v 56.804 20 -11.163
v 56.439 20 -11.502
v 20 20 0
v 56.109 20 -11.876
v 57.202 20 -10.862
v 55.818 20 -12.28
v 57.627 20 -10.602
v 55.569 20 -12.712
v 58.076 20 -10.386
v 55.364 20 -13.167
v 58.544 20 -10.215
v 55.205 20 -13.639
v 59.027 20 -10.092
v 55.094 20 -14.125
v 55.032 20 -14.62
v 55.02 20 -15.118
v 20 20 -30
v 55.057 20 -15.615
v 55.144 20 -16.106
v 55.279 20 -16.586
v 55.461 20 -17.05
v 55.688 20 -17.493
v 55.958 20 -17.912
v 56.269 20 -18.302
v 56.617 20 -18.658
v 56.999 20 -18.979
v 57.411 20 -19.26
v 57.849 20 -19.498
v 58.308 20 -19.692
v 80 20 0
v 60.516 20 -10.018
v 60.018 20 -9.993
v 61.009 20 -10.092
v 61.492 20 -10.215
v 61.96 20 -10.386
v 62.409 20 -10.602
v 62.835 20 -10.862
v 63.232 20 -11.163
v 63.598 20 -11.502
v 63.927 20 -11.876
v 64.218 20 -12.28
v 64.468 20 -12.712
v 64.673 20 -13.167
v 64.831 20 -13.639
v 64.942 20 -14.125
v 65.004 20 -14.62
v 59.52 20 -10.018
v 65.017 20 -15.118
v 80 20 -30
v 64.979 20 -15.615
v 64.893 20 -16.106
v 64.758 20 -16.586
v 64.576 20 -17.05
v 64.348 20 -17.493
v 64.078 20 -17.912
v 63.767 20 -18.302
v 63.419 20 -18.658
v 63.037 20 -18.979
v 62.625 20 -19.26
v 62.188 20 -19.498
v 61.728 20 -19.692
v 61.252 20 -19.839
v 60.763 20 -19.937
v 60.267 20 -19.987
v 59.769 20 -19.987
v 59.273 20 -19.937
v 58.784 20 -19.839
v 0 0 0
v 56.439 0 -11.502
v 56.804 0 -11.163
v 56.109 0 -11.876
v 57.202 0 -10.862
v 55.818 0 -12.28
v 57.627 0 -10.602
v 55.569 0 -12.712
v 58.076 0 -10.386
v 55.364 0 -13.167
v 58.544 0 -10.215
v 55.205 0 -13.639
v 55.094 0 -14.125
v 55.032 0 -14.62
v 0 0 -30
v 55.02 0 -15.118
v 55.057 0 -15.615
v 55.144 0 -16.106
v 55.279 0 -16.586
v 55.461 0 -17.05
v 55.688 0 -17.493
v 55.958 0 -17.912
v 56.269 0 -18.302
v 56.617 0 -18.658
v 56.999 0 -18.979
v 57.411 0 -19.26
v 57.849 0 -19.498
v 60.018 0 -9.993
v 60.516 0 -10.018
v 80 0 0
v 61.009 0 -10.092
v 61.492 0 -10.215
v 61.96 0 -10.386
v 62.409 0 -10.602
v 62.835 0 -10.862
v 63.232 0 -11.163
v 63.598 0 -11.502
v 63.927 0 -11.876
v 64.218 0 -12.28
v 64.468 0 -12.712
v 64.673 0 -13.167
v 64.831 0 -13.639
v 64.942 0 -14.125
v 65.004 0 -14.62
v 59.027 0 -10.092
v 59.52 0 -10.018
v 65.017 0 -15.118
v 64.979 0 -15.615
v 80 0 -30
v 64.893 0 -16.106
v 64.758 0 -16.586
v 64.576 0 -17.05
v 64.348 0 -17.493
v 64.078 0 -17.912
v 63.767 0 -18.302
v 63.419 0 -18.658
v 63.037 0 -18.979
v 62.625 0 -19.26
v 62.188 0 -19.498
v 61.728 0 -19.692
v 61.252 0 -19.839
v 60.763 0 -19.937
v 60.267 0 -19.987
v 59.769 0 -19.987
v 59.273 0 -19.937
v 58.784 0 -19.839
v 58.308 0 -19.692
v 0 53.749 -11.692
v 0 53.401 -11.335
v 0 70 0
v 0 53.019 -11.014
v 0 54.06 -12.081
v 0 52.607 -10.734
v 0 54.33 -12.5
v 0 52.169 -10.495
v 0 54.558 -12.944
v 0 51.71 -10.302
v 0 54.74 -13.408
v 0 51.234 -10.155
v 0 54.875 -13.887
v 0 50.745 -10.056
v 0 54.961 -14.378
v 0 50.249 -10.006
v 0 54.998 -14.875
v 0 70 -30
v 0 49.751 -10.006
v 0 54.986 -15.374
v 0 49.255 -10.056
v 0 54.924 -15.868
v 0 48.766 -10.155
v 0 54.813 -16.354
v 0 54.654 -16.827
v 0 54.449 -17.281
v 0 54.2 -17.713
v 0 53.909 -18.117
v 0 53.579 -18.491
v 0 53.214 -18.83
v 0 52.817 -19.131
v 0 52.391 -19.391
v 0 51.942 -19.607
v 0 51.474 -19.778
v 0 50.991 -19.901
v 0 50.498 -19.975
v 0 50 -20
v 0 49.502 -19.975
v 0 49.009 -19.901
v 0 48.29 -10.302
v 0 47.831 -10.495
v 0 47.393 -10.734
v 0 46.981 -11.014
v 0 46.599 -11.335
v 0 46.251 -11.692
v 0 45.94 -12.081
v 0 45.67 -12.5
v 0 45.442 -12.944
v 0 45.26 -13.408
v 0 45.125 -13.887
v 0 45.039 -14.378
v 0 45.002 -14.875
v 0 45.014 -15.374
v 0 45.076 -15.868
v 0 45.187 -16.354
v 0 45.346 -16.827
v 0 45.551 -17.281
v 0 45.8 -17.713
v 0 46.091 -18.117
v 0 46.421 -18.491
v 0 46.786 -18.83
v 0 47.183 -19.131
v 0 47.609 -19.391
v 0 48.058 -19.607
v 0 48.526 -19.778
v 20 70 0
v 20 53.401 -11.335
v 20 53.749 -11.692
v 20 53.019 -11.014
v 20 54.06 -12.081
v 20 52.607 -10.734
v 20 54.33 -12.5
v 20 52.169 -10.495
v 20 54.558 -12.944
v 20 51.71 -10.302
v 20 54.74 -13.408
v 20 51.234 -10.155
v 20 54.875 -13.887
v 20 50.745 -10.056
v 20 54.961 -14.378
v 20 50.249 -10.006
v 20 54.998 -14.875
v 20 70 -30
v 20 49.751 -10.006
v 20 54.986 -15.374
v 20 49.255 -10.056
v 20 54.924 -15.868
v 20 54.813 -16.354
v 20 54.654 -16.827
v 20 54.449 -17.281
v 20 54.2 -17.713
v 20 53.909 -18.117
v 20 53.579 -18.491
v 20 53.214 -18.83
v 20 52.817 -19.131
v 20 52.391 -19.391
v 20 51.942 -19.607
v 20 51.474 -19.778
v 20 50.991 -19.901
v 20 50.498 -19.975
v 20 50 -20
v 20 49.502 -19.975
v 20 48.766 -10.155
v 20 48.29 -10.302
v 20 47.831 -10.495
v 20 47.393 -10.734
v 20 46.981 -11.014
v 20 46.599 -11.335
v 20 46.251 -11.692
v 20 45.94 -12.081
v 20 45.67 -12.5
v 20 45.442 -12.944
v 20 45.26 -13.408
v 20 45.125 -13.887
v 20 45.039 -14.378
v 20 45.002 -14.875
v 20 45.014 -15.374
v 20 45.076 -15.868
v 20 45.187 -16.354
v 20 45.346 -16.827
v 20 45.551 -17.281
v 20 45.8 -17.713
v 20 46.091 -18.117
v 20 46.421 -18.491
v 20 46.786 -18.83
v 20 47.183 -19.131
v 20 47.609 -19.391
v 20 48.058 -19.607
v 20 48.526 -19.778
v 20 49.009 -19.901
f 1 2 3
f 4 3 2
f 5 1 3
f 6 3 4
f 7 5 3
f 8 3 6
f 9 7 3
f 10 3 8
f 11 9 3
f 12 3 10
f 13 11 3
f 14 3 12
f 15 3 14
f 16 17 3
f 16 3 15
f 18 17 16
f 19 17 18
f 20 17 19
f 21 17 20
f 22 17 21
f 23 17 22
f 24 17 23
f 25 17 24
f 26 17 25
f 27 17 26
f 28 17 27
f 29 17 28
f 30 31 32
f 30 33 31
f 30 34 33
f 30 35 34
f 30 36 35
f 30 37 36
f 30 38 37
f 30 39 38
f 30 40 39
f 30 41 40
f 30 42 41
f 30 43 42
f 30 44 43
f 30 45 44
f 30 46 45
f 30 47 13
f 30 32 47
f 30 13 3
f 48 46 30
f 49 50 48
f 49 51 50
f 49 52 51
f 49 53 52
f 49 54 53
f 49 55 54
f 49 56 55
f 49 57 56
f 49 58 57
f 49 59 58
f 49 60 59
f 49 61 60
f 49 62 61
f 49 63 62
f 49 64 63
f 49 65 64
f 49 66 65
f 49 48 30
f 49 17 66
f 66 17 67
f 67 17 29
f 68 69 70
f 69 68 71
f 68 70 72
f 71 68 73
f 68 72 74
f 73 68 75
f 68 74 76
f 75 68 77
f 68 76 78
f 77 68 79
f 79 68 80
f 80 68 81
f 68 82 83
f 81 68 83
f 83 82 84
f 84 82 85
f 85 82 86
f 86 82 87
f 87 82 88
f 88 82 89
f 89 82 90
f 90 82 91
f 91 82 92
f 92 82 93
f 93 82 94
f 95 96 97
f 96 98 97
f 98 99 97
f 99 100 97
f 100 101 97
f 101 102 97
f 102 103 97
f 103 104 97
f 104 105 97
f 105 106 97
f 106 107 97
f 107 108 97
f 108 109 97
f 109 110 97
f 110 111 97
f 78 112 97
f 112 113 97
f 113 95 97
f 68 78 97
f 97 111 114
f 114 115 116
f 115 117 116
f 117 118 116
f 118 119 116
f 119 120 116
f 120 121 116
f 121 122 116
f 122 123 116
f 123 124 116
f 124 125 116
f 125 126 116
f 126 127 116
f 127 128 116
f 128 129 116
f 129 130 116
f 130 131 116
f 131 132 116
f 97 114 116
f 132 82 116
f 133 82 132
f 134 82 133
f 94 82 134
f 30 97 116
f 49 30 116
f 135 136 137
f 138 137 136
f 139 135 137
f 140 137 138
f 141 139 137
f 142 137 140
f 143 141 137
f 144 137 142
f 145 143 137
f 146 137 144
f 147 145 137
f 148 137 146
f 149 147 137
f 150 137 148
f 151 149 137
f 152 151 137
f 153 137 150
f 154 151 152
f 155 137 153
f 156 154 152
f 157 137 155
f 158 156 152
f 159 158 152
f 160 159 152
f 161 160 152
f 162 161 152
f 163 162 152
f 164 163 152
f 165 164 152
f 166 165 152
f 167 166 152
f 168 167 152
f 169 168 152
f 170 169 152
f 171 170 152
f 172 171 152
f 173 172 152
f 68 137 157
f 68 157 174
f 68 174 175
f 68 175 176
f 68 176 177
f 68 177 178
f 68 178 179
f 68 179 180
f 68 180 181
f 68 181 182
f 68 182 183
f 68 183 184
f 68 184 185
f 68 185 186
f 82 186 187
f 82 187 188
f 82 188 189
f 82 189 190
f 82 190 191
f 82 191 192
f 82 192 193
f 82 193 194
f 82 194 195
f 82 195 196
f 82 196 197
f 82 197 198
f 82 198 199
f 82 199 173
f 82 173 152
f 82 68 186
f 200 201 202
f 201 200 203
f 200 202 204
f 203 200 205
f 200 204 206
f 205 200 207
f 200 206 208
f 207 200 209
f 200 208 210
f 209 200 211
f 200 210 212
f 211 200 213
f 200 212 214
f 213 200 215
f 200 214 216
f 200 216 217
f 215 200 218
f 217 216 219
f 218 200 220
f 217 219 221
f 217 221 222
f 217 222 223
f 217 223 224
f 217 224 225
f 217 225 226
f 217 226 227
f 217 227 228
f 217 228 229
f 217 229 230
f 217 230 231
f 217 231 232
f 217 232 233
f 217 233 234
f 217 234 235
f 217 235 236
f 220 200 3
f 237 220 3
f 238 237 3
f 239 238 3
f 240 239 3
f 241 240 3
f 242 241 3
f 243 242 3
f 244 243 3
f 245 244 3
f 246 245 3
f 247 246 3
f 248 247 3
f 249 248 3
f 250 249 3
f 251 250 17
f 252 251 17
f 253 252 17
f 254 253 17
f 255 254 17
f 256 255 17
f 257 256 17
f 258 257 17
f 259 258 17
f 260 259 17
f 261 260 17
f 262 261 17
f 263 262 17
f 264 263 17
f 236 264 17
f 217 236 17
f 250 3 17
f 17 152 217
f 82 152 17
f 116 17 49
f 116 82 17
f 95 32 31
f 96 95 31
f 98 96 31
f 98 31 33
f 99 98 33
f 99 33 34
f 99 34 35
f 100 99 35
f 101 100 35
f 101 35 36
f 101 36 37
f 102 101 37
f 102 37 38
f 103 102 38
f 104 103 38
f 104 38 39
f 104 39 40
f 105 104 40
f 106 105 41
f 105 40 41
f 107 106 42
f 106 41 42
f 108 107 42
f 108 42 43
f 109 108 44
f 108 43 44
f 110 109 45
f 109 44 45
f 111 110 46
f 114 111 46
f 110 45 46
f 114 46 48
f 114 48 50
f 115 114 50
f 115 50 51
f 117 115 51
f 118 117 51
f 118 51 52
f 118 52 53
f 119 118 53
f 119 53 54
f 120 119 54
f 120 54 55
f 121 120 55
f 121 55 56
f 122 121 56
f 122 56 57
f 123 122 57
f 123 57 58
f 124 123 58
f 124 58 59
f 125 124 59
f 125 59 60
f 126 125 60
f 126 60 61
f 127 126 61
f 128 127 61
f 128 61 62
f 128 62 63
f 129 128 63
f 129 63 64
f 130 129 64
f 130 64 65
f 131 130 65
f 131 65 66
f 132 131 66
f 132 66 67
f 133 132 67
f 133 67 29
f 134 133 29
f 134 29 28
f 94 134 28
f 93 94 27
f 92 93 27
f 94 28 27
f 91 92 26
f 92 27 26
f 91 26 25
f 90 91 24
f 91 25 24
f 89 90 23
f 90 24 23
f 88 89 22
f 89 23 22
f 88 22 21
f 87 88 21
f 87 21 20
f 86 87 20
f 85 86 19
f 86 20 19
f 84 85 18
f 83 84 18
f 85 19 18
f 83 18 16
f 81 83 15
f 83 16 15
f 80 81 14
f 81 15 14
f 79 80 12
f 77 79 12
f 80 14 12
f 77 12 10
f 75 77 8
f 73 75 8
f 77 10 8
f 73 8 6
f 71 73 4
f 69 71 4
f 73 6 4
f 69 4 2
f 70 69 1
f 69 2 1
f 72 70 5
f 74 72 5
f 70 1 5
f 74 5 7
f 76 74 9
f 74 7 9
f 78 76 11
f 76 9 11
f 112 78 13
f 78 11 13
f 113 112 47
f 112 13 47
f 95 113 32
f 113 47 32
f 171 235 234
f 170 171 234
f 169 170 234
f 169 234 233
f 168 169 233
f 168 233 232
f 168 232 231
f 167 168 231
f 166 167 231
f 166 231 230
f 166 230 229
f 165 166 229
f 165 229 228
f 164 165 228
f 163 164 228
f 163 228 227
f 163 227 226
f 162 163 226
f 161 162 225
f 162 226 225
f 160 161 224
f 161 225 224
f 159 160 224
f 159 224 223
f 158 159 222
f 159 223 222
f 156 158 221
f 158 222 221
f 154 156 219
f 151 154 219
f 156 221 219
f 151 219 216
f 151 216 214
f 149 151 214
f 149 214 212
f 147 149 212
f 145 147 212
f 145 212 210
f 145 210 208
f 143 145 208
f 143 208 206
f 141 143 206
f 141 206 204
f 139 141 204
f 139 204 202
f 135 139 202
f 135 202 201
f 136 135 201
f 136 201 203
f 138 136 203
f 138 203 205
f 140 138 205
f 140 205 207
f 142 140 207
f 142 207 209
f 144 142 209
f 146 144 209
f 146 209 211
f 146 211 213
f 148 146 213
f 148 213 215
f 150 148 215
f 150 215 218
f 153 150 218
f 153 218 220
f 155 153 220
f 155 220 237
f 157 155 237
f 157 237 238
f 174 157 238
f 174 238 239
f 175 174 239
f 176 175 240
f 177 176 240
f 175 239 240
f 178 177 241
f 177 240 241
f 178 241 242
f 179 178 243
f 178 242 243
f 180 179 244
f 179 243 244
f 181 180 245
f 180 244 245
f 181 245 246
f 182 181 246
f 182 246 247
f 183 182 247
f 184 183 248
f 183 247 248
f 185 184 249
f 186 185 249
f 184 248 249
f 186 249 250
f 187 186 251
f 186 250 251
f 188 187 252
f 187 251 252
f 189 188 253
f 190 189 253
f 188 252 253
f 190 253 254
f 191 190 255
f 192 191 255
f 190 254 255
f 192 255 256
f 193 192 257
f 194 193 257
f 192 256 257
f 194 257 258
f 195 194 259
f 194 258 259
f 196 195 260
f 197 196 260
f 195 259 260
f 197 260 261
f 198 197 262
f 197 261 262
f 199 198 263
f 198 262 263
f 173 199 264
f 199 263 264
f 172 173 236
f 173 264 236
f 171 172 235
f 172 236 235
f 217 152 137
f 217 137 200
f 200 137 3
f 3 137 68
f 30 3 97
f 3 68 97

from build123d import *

# Parameters (mm, degrees)
SKETCH1_W           = 80
SKETCH1_H           = 30
BOSS_EXTRUDE2_DEPTH = 20
SKETCH4_W           = 20
SKETCH4_H           = 30
BOSS_EXTRUDE3_DEPTH = 50
SKETCH6_R           = 5
CUT_EXTRUDE2_DEPTH  = 50
SKETCH7_R           = 5
CUT_EXTRUDE4_DEPTH  = 50


with BuildPart() as part:
    # Sketch1 → Boss-Extrude2 (new body)
    with BuildSketch(Plane(origin=(0, 0, 0), x_dir=(1, 0, 0), z_dir=(0, 1, 0))):
        with Locations((40, 15)):
            Rectangle(SKETCH1_W, SKETCH1_H)
    extrude(amount=BOSS_EXTRUDE2_DEPTH)

    # Sketch4 → Boss-Extrude3 (add)
    with BuildSketch(Plane(origin=(0, 20, 0), x_dir=(1, 0, 0), z_dir=(0, 1, 0))):
        with Locations((10, 15)):
            Rectangle(SKETCH4_W, SKETCH4_H)
    extrude(amount=BOSS_EXTRUDE3_DEPTH)

    # Sketch6 → Cut-Extrude2 (cut)
    with BuildSketch(Plane(origin=(0, 20, 0), x_dir=(1, 0, 0), z_dir=(0, 1, 0))):
        with Locations(Location((60.018182297, 14.993207378, 0), (0, 0, 270))):
            Circle(SKETCH6_R)
    extrude(amount=-CUT_EXTRUDE2_DEPTH, mode=Mode.SUBTRACT)

    # Sketch7 → Cut-Extrude4 (cut)
    with BuildSketch(Plane(origin=(20, 0, 0), x_dir=(0, 0, -1), z_dir=(1, 0, 0))):
        with Locations((15, 50)):
            Circle(SKETCH7_R)
    extrude(amount=-CUT_EXTRUDE4_DEPTH, mode=Mode.SUBTRACT)


solid = part.part
